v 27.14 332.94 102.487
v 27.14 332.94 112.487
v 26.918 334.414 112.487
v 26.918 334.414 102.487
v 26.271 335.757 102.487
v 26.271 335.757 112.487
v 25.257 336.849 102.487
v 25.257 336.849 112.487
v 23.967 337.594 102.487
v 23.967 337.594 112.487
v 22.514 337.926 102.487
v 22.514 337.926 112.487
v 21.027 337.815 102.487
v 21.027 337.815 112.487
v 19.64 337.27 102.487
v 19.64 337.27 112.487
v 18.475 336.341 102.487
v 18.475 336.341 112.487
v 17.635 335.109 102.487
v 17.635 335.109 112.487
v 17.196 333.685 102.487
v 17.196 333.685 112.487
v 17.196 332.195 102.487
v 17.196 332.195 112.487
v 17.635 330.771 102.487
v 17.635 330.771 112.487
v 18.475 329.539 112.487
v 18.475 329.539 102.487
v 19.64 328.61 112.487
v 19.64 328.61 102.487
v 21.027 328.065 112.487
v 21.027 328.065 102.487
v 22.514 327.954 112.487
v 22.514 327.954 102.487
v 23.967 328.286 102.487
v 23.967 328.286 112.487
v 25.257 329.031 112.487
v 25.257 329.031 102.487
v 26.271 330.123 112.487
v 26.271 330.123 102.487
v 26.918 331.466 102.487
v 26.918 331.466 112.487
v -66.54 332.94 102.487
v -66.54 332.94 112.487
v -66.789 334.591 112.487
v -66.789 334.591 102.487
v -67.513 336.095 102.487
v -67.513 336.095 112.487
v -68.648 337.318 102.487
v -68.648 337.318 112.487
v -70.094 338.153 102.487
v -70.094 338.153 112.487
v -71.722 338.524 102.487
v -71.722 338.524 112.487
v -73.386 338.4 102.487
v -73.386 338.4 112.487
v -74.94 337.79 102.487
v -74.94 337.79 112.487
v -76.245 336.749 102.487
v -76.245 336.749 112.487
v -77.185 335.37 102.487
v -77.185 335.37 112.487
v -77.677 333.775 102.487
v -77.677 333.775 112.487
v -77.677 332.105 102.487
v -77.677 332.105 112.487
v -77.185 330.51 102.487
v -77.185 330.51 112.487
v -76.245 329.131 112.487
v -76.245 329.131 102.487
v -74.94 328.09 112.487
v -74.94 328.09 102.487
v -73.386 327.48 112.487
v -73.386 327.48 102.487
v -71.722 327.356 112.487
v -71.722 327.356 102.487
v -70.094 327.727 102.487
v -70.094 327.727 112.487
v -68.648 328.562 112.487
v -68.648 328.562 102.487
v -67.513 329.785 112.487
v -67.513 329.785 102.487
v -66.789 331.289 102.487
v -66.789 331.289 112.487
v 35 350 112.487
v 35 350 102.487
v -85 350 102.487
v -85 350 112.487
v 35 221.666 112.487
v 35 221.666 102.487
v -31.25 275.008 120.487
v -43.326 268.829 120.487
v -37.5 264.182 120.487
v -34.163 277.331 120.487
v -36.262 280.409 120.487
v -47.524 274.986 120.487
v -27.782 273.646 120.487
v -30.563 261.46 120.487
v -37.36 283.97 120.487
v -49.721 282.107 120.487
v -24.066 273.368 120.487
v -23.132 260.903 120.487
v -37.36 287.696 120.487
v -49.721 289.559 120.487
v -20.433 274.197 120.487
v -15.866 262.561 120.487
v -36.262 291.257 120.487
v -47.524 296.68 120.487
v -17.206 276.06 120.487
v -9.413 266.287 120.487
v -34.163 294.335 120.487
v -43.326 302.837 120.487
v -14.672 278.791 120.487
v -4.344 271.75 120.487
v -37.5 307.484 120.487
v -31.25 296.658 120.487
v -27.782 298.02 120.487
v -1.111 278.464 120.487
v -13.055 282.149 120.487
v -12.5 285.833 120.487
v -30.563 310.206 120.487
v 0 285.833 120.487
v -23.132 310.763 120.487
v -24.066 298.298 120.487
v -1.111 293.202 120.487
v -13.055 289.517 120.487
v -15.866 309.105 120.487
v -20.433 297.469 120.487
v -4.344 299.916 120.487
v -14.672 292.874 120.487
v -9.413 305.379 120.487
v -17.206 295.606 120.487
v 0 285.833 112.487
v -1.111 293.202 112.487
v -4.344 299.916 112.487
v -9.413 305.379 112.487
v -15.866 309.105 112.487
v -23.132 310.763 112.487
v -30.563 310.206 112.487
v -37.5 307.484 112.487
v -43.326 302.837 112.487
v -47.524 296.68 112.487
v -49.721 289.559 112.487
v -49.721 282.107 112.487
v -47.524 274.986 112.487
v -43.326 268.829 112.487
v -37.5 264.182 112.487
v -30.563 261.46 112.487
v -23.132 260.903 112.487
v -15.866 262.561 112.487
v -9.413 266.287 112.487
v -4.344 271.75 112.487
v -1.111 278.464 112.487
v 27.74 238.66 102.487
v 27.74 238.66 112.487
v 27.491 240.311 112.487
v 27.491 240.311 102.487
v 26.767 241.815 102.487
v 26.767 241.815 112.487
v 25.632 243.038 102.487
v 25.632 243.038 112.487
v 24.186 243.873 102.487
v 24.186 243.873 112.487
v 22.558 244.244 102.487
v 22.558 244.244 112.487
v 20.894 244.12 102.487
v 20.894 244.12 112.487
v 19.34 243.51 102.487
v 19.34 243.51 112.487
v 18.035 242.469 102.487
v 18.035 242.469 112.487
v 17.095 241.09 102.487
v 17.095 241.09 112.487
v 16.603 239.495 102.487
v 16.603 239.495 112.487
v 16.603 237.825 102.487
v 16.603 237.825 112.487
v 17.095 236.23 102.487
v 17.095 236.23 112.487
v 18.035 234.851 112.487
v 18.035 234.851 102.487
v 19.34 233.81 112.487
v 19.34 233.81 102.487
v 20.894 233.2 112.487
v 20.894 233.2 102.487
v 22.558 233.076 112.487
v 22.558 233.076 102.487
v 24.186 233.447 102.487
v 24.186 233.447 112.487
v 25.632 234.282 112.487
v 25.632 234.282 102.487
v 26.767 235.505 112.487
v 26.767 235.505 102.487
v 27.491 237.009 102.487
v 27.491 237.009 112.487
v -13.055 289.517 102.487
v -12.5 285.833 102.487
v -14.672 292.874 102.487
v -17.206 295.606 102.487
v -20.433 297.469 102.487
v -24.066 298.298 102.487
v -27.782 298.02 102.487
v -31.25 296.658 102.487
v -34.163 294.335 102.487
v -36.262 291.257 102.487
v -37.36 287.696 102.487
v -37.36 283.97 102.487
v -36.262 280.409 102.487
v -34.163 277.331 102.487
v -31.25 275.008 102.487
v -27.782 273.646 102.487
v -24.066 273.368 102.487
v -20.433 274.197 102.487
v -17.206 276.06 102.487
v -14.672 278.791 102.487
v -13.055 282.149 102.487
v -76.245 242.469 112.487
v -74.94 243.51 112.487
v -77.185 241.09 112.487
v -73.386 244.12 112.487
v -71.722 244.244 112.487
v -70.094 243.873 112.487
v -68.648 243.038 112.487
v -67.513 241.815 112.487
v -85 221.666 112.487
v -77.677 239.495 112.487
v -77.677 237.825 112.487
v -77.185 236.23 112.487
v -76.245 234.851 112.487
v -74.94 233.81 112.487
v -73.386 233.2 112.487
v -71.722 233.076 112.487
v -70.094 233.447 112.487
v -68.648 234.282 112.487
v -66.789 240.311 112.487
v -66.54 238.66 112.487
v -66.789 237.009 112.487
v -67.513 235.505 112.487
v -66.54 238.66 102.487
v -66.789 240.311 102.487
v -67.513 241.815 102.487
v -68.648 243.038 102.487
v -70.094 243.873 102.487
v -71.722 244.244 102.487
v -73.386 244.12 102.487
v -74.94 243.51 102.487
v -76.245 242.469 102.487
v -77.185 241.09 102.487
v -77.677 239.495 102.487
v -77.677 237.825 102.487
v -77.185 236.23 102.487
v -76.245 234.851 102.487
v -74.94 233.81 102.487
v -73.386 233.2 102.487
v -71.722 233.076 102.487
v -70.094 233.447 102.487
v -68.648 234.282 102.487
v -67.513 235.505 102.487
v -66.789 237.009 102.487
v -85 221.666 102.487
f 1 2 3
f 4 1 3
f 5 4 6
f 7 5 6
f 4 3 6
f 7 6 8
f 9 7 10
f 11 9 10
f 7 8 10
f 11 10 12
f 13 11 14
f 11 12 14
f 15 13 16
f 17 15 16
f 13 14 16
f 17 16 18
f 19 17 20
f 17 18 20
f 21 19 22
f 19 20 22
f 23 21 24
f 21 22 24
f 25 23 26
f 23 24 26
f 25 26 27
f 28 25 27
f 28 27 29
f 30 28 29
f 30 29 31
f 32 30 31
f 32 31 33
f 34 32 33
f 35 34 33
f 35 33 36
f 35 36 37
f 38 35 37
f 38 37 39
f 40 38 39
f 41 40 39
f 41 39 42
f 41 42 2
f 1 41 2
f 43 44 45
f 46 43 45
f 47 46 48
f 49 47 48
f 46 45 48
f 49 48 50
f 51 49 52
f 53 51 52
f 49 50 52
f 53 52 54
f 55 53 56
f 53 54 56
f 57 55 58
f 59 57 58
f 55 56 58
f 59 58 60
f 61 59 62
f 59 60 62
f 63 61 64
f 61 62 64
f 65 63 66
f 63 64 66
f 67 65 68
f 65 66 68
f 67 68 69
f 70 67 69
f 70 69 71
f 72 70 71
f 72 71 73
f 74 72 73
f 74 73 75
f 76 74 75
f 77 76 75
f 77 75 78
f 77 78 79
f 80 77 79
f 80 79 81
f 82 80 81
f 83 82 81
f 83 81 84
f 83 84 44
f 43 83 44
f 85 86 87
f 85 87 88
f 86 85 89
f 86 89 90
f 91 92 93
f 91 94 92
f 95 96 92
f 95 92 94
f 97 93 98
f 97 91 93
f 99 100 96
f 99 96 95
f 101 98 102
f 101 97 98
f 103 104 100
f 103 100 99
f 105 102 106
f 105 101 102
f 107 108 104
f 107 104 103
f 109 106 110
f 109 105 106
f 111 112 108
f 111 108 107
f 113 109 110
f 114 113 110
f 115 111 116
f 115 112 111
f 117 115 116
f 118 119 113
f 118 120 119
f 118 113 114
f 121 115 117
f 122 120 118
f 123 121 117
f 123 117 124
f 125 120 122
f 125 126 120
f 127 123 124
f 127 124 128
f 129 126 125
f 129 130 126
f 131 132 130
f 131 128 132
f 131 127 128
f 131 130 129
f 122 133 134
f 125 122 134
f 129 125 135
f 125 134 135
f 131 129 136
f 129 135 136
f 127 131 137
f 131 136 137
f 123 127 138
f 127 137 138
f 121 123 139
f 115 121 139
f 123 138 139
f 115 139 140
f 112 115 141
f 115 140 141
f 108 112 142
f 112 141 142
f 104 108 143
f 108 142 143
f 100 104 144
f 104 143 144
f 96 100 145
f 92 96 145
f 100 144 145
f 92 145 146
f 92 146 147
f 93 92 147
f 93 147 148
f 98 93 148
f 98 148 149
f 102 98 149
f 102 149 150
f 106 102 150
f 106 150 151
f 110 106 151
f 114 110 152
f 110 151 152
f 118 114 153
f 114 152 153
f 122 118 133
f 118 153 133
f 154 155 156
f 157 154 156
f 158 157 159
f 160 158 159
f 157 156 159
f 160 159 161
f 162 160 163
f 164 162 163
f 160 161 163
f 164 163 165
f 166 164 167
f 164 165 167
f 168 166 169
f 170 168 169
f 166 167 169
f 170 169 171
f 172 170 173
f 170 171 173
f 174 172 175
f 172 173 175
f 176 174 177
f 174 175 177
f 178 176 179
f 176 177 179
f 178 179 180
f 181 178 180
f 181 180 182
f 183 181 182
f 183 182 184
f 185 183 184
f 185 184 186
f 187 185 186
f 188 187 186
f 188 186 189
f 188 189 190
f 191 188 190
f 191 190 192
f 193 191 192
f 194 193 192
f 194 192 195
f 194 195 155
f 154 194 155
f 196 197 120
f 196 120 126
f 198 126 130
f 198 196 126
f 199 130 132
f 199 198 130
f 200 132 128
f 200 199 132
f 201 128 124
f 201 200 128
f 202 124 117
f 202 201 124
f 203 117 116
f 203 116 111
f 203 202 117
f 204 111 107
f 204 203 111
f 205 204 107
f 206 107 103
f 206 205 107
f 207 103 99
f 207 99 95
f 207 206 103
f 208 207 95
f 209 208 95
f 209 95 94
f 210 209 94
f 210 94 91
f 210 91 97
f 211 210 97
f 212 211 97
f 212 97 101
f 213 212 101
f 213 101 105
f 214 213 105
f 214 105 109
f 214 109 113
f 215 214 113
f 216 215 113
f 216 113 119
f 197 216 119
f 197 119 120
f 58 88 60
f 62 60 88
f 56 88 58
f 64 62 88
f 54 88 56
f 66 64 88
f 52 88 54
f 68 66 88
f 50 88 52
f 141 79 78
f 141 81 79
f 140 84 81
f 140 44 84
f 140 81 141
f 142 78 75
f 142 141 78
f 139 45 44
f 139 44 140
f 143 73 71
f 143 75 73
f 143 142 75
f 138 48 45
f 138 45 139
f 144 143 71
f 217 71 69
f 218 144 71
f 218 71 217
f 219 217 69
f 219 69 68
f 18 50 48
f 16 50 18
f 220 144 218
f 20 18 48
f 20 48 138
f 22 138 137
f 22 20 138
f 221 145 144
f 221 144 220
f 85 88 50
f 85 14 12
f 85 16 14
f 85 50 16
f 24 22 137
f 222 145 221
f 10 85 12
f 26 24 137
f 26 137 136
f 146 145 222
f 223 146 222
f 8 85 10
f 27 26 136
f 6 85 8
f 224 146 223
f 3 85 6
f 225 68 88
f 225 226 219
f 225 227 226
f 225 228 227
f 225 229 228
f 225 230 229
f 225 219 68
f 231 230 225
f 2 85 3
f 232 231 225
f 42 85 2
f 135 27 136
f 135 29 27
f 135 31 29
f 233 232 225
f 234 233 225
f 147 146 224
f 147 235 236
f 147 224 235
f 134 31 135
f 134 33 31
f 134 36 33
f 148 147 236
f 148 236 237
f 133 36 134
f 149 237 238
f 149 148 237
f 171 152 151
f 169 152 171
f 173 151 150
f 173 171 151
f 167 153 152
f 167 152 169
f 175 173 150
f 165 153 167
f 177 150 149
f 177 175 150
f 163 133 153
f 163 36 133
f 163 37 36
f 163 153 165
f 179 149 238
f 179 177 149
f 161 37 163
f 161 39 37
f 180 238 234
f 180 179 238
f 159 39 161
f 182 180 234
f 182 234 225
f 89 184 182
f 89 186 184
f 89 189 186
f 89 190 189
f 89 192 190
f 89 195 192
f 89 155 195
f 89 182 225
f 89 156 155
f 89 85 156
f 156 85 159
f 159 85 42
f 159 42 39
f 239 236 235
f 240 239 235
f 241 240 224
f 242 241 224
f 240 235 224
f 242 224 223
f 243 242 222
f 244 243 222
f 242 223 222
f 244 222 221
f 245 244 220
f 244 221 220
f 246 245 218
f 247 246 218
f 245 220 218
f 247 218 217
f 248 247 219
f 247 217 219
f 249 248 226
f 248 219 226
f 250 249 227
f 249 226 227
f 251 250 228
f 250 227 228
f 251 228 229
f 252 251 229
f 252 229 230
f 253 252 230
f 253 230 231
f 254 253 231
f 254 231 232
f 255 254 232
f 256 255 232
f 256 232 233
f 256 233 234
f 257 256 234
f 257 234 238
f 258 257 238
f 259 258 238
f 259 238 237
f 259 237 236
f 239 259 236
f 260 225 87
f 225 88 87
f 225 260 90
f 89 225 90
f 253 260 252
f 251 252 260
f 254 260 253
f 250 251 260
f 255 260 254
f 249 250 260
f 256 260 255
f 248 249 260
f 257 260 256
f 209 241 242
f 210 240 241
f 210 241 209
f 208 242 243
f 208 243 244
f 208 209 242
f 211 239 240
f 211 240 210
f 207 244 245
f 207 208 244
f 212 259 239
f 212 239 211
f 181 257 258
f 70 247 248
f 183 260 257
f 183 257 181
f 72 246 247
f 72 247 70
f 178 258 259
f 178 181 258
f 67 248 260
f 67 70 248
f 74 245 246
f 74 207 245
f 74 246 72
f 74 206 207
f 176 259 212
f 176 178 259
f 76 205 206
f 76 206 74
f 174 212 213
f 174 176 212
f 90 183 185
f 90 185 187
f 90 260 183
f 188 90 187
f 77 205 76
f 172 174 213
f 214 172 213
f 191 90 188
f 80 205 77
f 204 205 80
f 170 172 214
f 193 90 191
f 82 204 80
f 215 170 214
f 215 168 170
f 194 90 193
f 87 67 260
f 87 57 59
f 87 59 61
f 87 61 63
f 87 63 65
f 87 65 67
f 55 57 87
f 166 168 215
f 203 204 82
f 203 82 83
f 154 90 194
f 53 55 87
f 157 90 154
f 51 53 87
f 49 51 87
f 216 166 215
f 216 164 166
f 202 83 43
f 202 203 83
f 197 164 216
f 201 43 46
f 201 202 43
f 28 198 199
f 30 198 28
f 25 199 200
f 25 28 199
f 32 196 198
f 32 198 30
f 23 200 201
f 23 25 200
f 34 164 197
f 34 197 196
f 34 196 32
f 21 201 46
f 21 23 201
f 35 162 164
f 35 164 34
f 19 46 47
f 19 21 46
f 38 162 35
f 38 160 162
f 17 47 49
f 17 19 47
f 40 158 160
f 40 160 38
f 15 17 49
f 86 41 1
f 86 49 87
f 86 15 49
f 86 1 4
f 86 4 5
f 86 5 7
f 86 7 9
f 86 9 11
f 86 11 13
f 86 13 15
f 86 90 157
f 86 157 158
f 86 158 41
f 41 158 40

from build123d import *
from OCP.BRepFilletAPI import BRepFilletAPI_MakeChamfer

# Parameters (mm, degrees)
SKETCH_1_W               = 150
SKETCH_1_H               = 150
EXTRUDE_1_DEPTH          = 20
SKETCH_2_W               = 200
SKETCH_2_H               = 170
EXTRUDE_2_DEPTH          = 20
SKETCH_3_W               = 200
SKETCH_3_H               = 22.5
EXTRUDE_3_DEPTH          = 20
SKETCH_4_W               = 200
SKETCH_4_H               = 101.536616744
SKETCH_4_R               = 12
EXTRUDE_4_DEPTH          = 10
SKETCH_5_W               = 200
SKETCH_5_H               = 170
EXTRUDE_5_DEPTH          = 10
SKETCH_6_W               = 12.361111111
SKETCH_6_H               = 120
EXTRUDE_6_DEPTH          = 60
CHAMFER_1_SIZE           = 10
CHAMFER_1_SIZE2          = 12.546778674
SKETCH_8_R               = 12.5
CUT_EXTRUDE_1_DEPTH      = 200
SKETCH_9_R               = 5.6
CUT_EXTRUDE_2_DEPTH      = 200
FILLET_1_R               = 10
SKETCH_10_R              = 40
SKETCH_10_R_2            = 8.532995409
EXTRUDE_7_DEPTH          = 5
SKETCH_11_R              = 12.5
CUT_EXTRUDE_3_DEPTH      = 200
SKETCH_12_W              = 50
SKETCH_12_H              = 12.140710291
EXTRUDE_8_DEPTH          = 120
EXTRUDE_9_DEPTH          = 120
SKETCH_14_R              = 5
SKETCH_14_R_2            = 5.6
CUT_EXTRUDE_4_DEPTH      = 200
CUT_EXTRUDE_5_DEPTH      = 428.663313117
CUT_EXTRUDE_5_DEPTH_BACK = 428.663313117
SKETCH_16_W              = 64.88929467
SKETCH_16_H              = 154.650571828
SKETCH_17_R              = 25
SKETCH_17_R_2            = 12.5
EXTRUDE_11_DEPTH         = 8
RIB_1_REACH              = 411.018
SKETCH_18_WALL_W         = 895.028437604
SKETCH_18_WALL_H         = 15
CUT_EXTRUDE_6_DEPTH      = 428.663313117
CUT_EXTRUDE_6_DEPTH_BACK = 428.663313117
CUT_EXTRUDE_7_DEPTH      = 390.123413038
CUT_EXTRUDE_7_DEPTH_BACK = 390.123413038
SKETCH_20_W              = 77.763891656
SKETCH_20_H              = 49.195078016
CUT_EXTRUDE_8_DEPTH      = 361.312364484
CUT_EXTRUDE_8_DEPTH_BACK = 361.312364484
SKETCH_21_OUTSIDE_W      = 157.88
SKETCH_21_OUTSIDE_H      = 170.021
SKETCH_21_OUTSIDE_W_2    = 120.000001731
SKETCH_21_OUTSIDE_H_2    = 128.334009182
CUT_EXTRUDE_9_DEPTH      = 361.312364484
CUT_EXTRUDE_9_DEPTH_BACK = 361.312364484
SKETCH_22_R              = 12.5


with BuildPart() as part:
    # 草图1 → 凸台-拉伸1 (new body)
    with BuildSketch(Plane(origin=(0, 0, 0), x_dir=(1, 0, 0), z_dir=(0, 1, 0))):
        Rectangle(SKETCH_1_W, SKETCH_1_H)
    extrude(amount=EXTRUDE_1_DEPTH)

    # 草图2 → 凸台-拉伸2 (add)
    with BuildSketch(Plane(origin=(0, 20, 0), x_dir=(1, 0, 0), z_dir=(0, 1, 0))):
        with Locations((-25, 0)):
            Rectangle(SKETCH_2_W, SKETCH_2_H)
    extrude(amount=-EXTRUDE_2_DEPTH)

    # 草图3 → 凸台-拉伸3 (add)
    with BuildSketch(Plane(origin=(0, 20, 0), x_dir=(1, 0, 0), z_dir=(0, 1, 0))):
        with Locations((-25, -96.25)):
            Rectangle(SKETCH_3_W, SKETCH_3_H)
    extrude(amount=-EXTRUDE_3_DEPTH)

    # 草图4 → 凸台-拉伸4 (add)
    with BuildSketch(Plane(origin=(0, 20, 0), x_dir=(1, 0, 0), z_dir=(0, 1, 0))):
        with Locations((-25, -135.768308372)):
            Rectangle(SKETCH_4_W, SKETCH_4_H)
        with Locations(Location((35, -147.018308372, 0), (0, 0, 270))):
            Circle(SKETCH_4_R, mode=Mode.SUBTRACT)
        with Locations(Location((-85, -147.018308372, 0), (0, 0, 270))):
            Circle(SKETCH_4_R, mode=Mode.SUBTRACT)
    extrude(amount=EXTRUDE_4_DEPTH)

    # 草图5 → 凸台-拉伸5 (add)
    with BuildSketch(Plane(origin=(0, 20, 0), x_dir=(1, 0, 0), z_dir=(0, 1, 0))):
        with Locations((-25, 0)):
            Rectangle(SKETCH_5_W, SKETCH_5_H)
    extrude(amount=EXTRUDE_5_DEPTH)

    # 草图6 → 凸台-拉伸6 (add, symmetric)
    with BuildSketch(Plane(origin=(-25, 0, 0), x_dir=(0, 0, -1), z_dir=(1, 0, 0))):
        Polygon((-67.5, 30), (-5, 30), (-42.777777778, 230), (-67.5, 230), align=None)
        with Locations((-61.319444445, 290)):
            Rectangle(SKETCH_6_W, SKETCH_6_H)
    extrude(amount=EXTRUDE_6_DEPTH, both=True)

    # 倒角1: one chamfer whose edges measure the first distance from different faces: ONE call of the kernel's chamfer builder (chamfer() names one face for all edges)
    chamfer_1_edges_1 = [part.edges().sort_by_distance(p)[0] for p in [
        (-85, 30, 36.25),
        (-25, 30, 67.5),
        (35, 30, 36.25),
    ]]
    chamfer_1_edges_2 = [part.edges().sort_by_distance(p)[0] for p in [
        (-25, 30, 5),
    ]]
    chamfer_1_side_2 = [part.faces().sort_by_distance(p)[0] for p in [
        (-121.627580479, 30, 50.768308372),
    ]]
    chamfer_1 = BRepFilletAPI_MakeChamfer(part.part.solid().wrapped)
    for e in chamfer_1_edges_1:
        chamfer_1.Add(CHAMFER_1_SIZE, e.wrapped)
    for e in chamfer_1_edges_2:
        chamfer_1.Add(CHAMFER_1_SIZE, CHAMFER_1_SIZE2, e.wrapped, chamfer_1_side_2[0].wrapped)  # the first distance lies on this face
    add(Compound.cast(chamfer_1.Shape()), mode=Mode.REPLACE)

    # 草图8 → 切除-拉伸1 (cut)
    with BuildSketch(Plane.XY.offset(67.5)):
        with Locations((-25, 285.8)):
            Circle(SKETCH_8_R)
    extrude(amount=-CUT_EXTRUDE_1_DEPTH, mode=Mode.SUBTRACT)

    # 草图9 → 切除-拉伸2 (cut)
    with BuildSketch(Plane.XY.offset(67.5)):
        with Locations((-72.14, 333.54)):
            Circle(SKETCH_9_R)
        with Locations((-72.14, 239.26)):
            Circle(SKETCH_9_R)
        with Locations((22.14, 239.26)):
            Circle(SKETCH_9_R)
        with Locations((22.14, 333.54)):
            Circle(SKETCH_9_R)
    extrude(amount=-CUT_EXTRUDE_2_DEPTH, mode=Mode.SUBTRACT)

    # 圆角1
    fillet_1_edges = [part.edges().sort_by_distance(p)[0] for p in [
        (35, 350, 61.319444444),
        (-85, 350, 61.319444444),
    ]]
    fillet(fillet_1_edges, radius=FILLET_1_R)

    # 草图10 → 凸台-拉伸7 (add)
    with BuildSketch(Plane.XY.offset(67.5)):
        with Locations((-25, 285.8)):
            Circle(SKETCH_10_R)
        with Locations((-25, 285.8)):
            Circle(SKETCH_10_R_2, mode=Mode.SUBTRACT)
    extrude(amount=EXTRUDE_7_DEPTH)

    # 草图11 → 切除-拉伸3 (cut)
    with BuildSketch(Plane.XY.offset(72.5)):
        with Locations((-25, 285.8)):
            Circle(SKETCH_11_R)
    extrude(amount=-CUT_EXTRUDE_3_DEPTH, mode=Mode.SUBTRACT)

    # 草图12 → 凸台-拉伸8 (add)
    with BuildSketch(Plane(origin=(35, 0, 0), x_dir=(0, 0, -1), z_dir=(1, 0, 0))):
        with Locations((-67.777777778, 223.929644855)):
            Rectangle(SKETCH_12_W, SKETCH_12_H)
    extrude(amount=-EXTRUDE_8_DEPTH)

    # 草图13 → 凸台-拉伸9 (add)
    with BuildSketch(Plane(origin=(35, 0, 0), x_dir=(0, 0, -1), z_dir=(1, 0, 0))):
        Polygon((-92.777777778, 230), (-102.486640647, 230), (-102.486640647, 350), (-112.486640647, 350), (-112.486640647, 230), (-112.486640647, 217.859289709), (-92.777777778, 217.859289709), align=None)
    extrude(amount=-EXTRUDE_9_DEPTH)

    # 草图14 → 切除-拉伸4 (cut)
    with BuildSketch(Plane.XY.offset(112.486640647)):
        with Locations((22.14, 332.94)):
            Circle(SKETCH_14_R)
        with Locations((22.14, 238.66)):
            Circle(SKETCH_14_R_2)
        with Locations((-72.14, 238.66)):
            Circle(SKETCH_14_R_2)
        with Locations((-72.14, 332.94)):
            Circle(SKETCH_14_R_2)
    extrude(amount=-CUT_EXTRUDE_4_DEPTH, mode=Mode.SUBTRACT)

    # 草图16 → 切除-拉伸5 (cut, two sides: drawn at the far end of the back side and taken through both)
    with BuildSketch(Plane.ZY.offset(85).offset(-CUT_EXTRUDE_5_DEPTH_BACK)):
        with Locations((49.451016332, 307.325285914)):
            Rectangle(SKETCH_16_W, SKETCH_16_H)
    extrude(amount=CUT_EXTRUDE_5_DEPTH + CUT_EXTRUDE_5_DEPTH_BACK, mode=Mode.SUBTRACT)

    # 草图17 → 凸台-拉伸11 (add)
    with BuildSketch(Plane.XY.offset(112.486640647)):
        with Locations((-24.999999135, 285.832995409)):
            Circle(SKETCH_17_R)
        with Locations((-24.999999135, 285.832995409)):
            Circle(SKETCH_17_R_2, mode=Mode.SUBTRACT)
    extrude(amount=EXTRUDE_11_DEPTH)

    # 草图18 wall → 筋1 (add, up to next)
    with BuildSketch(Plane(origin=(-25, 187.859289709, 89.993320324), x_dir=(0, -0.800085500873, -0.599885981911), z_dir=(0, 0.599885981911, -0.800085500873)), mode=Mode.PRIVATE) as rib_1_sk1:
        Rectangle(SKETCH_18_WALL_W, SKETCH_18_WALL_H)
    rib_1_tool1 = extrude(rib_1_sk1.sketch, amount=RIB_1_REACH, mode=Mode.PRIVATE) - part.part
    add(rib_1_tool1.solids().sort_by_distance((-25, 187.859289709, 89.993320324))[0])

    # 草图19 → 切除-拉伸6 (cut, two sides: drawn at the far end of the back side and taken through both)
    with BuildSketch(Plane(origin=(35, 0, 0), x_dir=(0, 0, -1), z_dir=(1, 0, 0)).offset(-CUT_EXTRUDE_6_DEPTH_BACK)):
        Polygon((-112.486640647, 217.859289709), (203.167671069, 217.859289709), (203.167671069, -23.133322037), (-112.486640647, -23.133322037), (-240.759412705, -23.133322037), (-240.759412705, 217.859289709), align=None)
    extrude(amount=CUT_EXTRUDE_6_DEPTH + CUT_EXTRUDE_6_DEPTH_BACK, mode=Mode.SUBTRACT)

    # 草图20 → 切除-拉伸7 (cut, two sides: drawn at the far end of the back side and taken through both)
    with BuildSketch(Plane(origin=(35, 0, 0), x_dir=(0, 0, -1), z_dir=(1, 0, 0)).offset(-CUT_EXTRUDE_7_DEPTH_BACK)):
        with Locations((-63.604694819, 225.128578756)):
            Rectangle(SKETCH_20_W, SKETCH_20_H)
    extrude(amount=CUT_EXTRUDE_7_DEPTH + CUT_EXTRUDE_7_DEPTH_BACK, mode=Mode.SUBTRACT)

    # 草图21 outside → 切除-拉伸8 (cut, two sides: drawn at the far end of the back side and taken through both)
    with BuildSketch(Plane.XY.offset(112.486640647).offset(-CUT_EXTRUDE_8_DEPTH_BACK)):
        with Locations((-25, 283.9295)):
            Rectangle(SKETCH_21_OUTSIDE_W, SKETCH_21_OUTSIDE_H)
        with Locations((-24.999999134, 285.832995409)):
            Rectangle(SKETCH_21_OUTSIDE_W_2, SKETCH_21_OUTSIDE_H_2, mode=Mode.SUBTRACT)
    extrude(amount=CUT_EXTRUDE_8_DEPTH + CUT_EXTRUDE_8_DEPTH_BACK, mode=Mode.SUBTRACT)

    # 草图22 → 切除-拉伸9 (cut, two sides: drawn at the far end of the back side and taken through both)
    with BuildSketch(Plane.XY.offset(112.486640647).offset(-CUT_EXTRUDE_9_DEPTH_BACK)):
        with Locations((-24.999999135, 285.832995409)):
            Circle(SKETCH_22_R)
    extrude(amount=CUT_EXTRUDE_9_DEPTH + CUT_EXTRUDE_9_DEPTH_BACK, mode=Mode.SUBTRACT)


solid = part.part
